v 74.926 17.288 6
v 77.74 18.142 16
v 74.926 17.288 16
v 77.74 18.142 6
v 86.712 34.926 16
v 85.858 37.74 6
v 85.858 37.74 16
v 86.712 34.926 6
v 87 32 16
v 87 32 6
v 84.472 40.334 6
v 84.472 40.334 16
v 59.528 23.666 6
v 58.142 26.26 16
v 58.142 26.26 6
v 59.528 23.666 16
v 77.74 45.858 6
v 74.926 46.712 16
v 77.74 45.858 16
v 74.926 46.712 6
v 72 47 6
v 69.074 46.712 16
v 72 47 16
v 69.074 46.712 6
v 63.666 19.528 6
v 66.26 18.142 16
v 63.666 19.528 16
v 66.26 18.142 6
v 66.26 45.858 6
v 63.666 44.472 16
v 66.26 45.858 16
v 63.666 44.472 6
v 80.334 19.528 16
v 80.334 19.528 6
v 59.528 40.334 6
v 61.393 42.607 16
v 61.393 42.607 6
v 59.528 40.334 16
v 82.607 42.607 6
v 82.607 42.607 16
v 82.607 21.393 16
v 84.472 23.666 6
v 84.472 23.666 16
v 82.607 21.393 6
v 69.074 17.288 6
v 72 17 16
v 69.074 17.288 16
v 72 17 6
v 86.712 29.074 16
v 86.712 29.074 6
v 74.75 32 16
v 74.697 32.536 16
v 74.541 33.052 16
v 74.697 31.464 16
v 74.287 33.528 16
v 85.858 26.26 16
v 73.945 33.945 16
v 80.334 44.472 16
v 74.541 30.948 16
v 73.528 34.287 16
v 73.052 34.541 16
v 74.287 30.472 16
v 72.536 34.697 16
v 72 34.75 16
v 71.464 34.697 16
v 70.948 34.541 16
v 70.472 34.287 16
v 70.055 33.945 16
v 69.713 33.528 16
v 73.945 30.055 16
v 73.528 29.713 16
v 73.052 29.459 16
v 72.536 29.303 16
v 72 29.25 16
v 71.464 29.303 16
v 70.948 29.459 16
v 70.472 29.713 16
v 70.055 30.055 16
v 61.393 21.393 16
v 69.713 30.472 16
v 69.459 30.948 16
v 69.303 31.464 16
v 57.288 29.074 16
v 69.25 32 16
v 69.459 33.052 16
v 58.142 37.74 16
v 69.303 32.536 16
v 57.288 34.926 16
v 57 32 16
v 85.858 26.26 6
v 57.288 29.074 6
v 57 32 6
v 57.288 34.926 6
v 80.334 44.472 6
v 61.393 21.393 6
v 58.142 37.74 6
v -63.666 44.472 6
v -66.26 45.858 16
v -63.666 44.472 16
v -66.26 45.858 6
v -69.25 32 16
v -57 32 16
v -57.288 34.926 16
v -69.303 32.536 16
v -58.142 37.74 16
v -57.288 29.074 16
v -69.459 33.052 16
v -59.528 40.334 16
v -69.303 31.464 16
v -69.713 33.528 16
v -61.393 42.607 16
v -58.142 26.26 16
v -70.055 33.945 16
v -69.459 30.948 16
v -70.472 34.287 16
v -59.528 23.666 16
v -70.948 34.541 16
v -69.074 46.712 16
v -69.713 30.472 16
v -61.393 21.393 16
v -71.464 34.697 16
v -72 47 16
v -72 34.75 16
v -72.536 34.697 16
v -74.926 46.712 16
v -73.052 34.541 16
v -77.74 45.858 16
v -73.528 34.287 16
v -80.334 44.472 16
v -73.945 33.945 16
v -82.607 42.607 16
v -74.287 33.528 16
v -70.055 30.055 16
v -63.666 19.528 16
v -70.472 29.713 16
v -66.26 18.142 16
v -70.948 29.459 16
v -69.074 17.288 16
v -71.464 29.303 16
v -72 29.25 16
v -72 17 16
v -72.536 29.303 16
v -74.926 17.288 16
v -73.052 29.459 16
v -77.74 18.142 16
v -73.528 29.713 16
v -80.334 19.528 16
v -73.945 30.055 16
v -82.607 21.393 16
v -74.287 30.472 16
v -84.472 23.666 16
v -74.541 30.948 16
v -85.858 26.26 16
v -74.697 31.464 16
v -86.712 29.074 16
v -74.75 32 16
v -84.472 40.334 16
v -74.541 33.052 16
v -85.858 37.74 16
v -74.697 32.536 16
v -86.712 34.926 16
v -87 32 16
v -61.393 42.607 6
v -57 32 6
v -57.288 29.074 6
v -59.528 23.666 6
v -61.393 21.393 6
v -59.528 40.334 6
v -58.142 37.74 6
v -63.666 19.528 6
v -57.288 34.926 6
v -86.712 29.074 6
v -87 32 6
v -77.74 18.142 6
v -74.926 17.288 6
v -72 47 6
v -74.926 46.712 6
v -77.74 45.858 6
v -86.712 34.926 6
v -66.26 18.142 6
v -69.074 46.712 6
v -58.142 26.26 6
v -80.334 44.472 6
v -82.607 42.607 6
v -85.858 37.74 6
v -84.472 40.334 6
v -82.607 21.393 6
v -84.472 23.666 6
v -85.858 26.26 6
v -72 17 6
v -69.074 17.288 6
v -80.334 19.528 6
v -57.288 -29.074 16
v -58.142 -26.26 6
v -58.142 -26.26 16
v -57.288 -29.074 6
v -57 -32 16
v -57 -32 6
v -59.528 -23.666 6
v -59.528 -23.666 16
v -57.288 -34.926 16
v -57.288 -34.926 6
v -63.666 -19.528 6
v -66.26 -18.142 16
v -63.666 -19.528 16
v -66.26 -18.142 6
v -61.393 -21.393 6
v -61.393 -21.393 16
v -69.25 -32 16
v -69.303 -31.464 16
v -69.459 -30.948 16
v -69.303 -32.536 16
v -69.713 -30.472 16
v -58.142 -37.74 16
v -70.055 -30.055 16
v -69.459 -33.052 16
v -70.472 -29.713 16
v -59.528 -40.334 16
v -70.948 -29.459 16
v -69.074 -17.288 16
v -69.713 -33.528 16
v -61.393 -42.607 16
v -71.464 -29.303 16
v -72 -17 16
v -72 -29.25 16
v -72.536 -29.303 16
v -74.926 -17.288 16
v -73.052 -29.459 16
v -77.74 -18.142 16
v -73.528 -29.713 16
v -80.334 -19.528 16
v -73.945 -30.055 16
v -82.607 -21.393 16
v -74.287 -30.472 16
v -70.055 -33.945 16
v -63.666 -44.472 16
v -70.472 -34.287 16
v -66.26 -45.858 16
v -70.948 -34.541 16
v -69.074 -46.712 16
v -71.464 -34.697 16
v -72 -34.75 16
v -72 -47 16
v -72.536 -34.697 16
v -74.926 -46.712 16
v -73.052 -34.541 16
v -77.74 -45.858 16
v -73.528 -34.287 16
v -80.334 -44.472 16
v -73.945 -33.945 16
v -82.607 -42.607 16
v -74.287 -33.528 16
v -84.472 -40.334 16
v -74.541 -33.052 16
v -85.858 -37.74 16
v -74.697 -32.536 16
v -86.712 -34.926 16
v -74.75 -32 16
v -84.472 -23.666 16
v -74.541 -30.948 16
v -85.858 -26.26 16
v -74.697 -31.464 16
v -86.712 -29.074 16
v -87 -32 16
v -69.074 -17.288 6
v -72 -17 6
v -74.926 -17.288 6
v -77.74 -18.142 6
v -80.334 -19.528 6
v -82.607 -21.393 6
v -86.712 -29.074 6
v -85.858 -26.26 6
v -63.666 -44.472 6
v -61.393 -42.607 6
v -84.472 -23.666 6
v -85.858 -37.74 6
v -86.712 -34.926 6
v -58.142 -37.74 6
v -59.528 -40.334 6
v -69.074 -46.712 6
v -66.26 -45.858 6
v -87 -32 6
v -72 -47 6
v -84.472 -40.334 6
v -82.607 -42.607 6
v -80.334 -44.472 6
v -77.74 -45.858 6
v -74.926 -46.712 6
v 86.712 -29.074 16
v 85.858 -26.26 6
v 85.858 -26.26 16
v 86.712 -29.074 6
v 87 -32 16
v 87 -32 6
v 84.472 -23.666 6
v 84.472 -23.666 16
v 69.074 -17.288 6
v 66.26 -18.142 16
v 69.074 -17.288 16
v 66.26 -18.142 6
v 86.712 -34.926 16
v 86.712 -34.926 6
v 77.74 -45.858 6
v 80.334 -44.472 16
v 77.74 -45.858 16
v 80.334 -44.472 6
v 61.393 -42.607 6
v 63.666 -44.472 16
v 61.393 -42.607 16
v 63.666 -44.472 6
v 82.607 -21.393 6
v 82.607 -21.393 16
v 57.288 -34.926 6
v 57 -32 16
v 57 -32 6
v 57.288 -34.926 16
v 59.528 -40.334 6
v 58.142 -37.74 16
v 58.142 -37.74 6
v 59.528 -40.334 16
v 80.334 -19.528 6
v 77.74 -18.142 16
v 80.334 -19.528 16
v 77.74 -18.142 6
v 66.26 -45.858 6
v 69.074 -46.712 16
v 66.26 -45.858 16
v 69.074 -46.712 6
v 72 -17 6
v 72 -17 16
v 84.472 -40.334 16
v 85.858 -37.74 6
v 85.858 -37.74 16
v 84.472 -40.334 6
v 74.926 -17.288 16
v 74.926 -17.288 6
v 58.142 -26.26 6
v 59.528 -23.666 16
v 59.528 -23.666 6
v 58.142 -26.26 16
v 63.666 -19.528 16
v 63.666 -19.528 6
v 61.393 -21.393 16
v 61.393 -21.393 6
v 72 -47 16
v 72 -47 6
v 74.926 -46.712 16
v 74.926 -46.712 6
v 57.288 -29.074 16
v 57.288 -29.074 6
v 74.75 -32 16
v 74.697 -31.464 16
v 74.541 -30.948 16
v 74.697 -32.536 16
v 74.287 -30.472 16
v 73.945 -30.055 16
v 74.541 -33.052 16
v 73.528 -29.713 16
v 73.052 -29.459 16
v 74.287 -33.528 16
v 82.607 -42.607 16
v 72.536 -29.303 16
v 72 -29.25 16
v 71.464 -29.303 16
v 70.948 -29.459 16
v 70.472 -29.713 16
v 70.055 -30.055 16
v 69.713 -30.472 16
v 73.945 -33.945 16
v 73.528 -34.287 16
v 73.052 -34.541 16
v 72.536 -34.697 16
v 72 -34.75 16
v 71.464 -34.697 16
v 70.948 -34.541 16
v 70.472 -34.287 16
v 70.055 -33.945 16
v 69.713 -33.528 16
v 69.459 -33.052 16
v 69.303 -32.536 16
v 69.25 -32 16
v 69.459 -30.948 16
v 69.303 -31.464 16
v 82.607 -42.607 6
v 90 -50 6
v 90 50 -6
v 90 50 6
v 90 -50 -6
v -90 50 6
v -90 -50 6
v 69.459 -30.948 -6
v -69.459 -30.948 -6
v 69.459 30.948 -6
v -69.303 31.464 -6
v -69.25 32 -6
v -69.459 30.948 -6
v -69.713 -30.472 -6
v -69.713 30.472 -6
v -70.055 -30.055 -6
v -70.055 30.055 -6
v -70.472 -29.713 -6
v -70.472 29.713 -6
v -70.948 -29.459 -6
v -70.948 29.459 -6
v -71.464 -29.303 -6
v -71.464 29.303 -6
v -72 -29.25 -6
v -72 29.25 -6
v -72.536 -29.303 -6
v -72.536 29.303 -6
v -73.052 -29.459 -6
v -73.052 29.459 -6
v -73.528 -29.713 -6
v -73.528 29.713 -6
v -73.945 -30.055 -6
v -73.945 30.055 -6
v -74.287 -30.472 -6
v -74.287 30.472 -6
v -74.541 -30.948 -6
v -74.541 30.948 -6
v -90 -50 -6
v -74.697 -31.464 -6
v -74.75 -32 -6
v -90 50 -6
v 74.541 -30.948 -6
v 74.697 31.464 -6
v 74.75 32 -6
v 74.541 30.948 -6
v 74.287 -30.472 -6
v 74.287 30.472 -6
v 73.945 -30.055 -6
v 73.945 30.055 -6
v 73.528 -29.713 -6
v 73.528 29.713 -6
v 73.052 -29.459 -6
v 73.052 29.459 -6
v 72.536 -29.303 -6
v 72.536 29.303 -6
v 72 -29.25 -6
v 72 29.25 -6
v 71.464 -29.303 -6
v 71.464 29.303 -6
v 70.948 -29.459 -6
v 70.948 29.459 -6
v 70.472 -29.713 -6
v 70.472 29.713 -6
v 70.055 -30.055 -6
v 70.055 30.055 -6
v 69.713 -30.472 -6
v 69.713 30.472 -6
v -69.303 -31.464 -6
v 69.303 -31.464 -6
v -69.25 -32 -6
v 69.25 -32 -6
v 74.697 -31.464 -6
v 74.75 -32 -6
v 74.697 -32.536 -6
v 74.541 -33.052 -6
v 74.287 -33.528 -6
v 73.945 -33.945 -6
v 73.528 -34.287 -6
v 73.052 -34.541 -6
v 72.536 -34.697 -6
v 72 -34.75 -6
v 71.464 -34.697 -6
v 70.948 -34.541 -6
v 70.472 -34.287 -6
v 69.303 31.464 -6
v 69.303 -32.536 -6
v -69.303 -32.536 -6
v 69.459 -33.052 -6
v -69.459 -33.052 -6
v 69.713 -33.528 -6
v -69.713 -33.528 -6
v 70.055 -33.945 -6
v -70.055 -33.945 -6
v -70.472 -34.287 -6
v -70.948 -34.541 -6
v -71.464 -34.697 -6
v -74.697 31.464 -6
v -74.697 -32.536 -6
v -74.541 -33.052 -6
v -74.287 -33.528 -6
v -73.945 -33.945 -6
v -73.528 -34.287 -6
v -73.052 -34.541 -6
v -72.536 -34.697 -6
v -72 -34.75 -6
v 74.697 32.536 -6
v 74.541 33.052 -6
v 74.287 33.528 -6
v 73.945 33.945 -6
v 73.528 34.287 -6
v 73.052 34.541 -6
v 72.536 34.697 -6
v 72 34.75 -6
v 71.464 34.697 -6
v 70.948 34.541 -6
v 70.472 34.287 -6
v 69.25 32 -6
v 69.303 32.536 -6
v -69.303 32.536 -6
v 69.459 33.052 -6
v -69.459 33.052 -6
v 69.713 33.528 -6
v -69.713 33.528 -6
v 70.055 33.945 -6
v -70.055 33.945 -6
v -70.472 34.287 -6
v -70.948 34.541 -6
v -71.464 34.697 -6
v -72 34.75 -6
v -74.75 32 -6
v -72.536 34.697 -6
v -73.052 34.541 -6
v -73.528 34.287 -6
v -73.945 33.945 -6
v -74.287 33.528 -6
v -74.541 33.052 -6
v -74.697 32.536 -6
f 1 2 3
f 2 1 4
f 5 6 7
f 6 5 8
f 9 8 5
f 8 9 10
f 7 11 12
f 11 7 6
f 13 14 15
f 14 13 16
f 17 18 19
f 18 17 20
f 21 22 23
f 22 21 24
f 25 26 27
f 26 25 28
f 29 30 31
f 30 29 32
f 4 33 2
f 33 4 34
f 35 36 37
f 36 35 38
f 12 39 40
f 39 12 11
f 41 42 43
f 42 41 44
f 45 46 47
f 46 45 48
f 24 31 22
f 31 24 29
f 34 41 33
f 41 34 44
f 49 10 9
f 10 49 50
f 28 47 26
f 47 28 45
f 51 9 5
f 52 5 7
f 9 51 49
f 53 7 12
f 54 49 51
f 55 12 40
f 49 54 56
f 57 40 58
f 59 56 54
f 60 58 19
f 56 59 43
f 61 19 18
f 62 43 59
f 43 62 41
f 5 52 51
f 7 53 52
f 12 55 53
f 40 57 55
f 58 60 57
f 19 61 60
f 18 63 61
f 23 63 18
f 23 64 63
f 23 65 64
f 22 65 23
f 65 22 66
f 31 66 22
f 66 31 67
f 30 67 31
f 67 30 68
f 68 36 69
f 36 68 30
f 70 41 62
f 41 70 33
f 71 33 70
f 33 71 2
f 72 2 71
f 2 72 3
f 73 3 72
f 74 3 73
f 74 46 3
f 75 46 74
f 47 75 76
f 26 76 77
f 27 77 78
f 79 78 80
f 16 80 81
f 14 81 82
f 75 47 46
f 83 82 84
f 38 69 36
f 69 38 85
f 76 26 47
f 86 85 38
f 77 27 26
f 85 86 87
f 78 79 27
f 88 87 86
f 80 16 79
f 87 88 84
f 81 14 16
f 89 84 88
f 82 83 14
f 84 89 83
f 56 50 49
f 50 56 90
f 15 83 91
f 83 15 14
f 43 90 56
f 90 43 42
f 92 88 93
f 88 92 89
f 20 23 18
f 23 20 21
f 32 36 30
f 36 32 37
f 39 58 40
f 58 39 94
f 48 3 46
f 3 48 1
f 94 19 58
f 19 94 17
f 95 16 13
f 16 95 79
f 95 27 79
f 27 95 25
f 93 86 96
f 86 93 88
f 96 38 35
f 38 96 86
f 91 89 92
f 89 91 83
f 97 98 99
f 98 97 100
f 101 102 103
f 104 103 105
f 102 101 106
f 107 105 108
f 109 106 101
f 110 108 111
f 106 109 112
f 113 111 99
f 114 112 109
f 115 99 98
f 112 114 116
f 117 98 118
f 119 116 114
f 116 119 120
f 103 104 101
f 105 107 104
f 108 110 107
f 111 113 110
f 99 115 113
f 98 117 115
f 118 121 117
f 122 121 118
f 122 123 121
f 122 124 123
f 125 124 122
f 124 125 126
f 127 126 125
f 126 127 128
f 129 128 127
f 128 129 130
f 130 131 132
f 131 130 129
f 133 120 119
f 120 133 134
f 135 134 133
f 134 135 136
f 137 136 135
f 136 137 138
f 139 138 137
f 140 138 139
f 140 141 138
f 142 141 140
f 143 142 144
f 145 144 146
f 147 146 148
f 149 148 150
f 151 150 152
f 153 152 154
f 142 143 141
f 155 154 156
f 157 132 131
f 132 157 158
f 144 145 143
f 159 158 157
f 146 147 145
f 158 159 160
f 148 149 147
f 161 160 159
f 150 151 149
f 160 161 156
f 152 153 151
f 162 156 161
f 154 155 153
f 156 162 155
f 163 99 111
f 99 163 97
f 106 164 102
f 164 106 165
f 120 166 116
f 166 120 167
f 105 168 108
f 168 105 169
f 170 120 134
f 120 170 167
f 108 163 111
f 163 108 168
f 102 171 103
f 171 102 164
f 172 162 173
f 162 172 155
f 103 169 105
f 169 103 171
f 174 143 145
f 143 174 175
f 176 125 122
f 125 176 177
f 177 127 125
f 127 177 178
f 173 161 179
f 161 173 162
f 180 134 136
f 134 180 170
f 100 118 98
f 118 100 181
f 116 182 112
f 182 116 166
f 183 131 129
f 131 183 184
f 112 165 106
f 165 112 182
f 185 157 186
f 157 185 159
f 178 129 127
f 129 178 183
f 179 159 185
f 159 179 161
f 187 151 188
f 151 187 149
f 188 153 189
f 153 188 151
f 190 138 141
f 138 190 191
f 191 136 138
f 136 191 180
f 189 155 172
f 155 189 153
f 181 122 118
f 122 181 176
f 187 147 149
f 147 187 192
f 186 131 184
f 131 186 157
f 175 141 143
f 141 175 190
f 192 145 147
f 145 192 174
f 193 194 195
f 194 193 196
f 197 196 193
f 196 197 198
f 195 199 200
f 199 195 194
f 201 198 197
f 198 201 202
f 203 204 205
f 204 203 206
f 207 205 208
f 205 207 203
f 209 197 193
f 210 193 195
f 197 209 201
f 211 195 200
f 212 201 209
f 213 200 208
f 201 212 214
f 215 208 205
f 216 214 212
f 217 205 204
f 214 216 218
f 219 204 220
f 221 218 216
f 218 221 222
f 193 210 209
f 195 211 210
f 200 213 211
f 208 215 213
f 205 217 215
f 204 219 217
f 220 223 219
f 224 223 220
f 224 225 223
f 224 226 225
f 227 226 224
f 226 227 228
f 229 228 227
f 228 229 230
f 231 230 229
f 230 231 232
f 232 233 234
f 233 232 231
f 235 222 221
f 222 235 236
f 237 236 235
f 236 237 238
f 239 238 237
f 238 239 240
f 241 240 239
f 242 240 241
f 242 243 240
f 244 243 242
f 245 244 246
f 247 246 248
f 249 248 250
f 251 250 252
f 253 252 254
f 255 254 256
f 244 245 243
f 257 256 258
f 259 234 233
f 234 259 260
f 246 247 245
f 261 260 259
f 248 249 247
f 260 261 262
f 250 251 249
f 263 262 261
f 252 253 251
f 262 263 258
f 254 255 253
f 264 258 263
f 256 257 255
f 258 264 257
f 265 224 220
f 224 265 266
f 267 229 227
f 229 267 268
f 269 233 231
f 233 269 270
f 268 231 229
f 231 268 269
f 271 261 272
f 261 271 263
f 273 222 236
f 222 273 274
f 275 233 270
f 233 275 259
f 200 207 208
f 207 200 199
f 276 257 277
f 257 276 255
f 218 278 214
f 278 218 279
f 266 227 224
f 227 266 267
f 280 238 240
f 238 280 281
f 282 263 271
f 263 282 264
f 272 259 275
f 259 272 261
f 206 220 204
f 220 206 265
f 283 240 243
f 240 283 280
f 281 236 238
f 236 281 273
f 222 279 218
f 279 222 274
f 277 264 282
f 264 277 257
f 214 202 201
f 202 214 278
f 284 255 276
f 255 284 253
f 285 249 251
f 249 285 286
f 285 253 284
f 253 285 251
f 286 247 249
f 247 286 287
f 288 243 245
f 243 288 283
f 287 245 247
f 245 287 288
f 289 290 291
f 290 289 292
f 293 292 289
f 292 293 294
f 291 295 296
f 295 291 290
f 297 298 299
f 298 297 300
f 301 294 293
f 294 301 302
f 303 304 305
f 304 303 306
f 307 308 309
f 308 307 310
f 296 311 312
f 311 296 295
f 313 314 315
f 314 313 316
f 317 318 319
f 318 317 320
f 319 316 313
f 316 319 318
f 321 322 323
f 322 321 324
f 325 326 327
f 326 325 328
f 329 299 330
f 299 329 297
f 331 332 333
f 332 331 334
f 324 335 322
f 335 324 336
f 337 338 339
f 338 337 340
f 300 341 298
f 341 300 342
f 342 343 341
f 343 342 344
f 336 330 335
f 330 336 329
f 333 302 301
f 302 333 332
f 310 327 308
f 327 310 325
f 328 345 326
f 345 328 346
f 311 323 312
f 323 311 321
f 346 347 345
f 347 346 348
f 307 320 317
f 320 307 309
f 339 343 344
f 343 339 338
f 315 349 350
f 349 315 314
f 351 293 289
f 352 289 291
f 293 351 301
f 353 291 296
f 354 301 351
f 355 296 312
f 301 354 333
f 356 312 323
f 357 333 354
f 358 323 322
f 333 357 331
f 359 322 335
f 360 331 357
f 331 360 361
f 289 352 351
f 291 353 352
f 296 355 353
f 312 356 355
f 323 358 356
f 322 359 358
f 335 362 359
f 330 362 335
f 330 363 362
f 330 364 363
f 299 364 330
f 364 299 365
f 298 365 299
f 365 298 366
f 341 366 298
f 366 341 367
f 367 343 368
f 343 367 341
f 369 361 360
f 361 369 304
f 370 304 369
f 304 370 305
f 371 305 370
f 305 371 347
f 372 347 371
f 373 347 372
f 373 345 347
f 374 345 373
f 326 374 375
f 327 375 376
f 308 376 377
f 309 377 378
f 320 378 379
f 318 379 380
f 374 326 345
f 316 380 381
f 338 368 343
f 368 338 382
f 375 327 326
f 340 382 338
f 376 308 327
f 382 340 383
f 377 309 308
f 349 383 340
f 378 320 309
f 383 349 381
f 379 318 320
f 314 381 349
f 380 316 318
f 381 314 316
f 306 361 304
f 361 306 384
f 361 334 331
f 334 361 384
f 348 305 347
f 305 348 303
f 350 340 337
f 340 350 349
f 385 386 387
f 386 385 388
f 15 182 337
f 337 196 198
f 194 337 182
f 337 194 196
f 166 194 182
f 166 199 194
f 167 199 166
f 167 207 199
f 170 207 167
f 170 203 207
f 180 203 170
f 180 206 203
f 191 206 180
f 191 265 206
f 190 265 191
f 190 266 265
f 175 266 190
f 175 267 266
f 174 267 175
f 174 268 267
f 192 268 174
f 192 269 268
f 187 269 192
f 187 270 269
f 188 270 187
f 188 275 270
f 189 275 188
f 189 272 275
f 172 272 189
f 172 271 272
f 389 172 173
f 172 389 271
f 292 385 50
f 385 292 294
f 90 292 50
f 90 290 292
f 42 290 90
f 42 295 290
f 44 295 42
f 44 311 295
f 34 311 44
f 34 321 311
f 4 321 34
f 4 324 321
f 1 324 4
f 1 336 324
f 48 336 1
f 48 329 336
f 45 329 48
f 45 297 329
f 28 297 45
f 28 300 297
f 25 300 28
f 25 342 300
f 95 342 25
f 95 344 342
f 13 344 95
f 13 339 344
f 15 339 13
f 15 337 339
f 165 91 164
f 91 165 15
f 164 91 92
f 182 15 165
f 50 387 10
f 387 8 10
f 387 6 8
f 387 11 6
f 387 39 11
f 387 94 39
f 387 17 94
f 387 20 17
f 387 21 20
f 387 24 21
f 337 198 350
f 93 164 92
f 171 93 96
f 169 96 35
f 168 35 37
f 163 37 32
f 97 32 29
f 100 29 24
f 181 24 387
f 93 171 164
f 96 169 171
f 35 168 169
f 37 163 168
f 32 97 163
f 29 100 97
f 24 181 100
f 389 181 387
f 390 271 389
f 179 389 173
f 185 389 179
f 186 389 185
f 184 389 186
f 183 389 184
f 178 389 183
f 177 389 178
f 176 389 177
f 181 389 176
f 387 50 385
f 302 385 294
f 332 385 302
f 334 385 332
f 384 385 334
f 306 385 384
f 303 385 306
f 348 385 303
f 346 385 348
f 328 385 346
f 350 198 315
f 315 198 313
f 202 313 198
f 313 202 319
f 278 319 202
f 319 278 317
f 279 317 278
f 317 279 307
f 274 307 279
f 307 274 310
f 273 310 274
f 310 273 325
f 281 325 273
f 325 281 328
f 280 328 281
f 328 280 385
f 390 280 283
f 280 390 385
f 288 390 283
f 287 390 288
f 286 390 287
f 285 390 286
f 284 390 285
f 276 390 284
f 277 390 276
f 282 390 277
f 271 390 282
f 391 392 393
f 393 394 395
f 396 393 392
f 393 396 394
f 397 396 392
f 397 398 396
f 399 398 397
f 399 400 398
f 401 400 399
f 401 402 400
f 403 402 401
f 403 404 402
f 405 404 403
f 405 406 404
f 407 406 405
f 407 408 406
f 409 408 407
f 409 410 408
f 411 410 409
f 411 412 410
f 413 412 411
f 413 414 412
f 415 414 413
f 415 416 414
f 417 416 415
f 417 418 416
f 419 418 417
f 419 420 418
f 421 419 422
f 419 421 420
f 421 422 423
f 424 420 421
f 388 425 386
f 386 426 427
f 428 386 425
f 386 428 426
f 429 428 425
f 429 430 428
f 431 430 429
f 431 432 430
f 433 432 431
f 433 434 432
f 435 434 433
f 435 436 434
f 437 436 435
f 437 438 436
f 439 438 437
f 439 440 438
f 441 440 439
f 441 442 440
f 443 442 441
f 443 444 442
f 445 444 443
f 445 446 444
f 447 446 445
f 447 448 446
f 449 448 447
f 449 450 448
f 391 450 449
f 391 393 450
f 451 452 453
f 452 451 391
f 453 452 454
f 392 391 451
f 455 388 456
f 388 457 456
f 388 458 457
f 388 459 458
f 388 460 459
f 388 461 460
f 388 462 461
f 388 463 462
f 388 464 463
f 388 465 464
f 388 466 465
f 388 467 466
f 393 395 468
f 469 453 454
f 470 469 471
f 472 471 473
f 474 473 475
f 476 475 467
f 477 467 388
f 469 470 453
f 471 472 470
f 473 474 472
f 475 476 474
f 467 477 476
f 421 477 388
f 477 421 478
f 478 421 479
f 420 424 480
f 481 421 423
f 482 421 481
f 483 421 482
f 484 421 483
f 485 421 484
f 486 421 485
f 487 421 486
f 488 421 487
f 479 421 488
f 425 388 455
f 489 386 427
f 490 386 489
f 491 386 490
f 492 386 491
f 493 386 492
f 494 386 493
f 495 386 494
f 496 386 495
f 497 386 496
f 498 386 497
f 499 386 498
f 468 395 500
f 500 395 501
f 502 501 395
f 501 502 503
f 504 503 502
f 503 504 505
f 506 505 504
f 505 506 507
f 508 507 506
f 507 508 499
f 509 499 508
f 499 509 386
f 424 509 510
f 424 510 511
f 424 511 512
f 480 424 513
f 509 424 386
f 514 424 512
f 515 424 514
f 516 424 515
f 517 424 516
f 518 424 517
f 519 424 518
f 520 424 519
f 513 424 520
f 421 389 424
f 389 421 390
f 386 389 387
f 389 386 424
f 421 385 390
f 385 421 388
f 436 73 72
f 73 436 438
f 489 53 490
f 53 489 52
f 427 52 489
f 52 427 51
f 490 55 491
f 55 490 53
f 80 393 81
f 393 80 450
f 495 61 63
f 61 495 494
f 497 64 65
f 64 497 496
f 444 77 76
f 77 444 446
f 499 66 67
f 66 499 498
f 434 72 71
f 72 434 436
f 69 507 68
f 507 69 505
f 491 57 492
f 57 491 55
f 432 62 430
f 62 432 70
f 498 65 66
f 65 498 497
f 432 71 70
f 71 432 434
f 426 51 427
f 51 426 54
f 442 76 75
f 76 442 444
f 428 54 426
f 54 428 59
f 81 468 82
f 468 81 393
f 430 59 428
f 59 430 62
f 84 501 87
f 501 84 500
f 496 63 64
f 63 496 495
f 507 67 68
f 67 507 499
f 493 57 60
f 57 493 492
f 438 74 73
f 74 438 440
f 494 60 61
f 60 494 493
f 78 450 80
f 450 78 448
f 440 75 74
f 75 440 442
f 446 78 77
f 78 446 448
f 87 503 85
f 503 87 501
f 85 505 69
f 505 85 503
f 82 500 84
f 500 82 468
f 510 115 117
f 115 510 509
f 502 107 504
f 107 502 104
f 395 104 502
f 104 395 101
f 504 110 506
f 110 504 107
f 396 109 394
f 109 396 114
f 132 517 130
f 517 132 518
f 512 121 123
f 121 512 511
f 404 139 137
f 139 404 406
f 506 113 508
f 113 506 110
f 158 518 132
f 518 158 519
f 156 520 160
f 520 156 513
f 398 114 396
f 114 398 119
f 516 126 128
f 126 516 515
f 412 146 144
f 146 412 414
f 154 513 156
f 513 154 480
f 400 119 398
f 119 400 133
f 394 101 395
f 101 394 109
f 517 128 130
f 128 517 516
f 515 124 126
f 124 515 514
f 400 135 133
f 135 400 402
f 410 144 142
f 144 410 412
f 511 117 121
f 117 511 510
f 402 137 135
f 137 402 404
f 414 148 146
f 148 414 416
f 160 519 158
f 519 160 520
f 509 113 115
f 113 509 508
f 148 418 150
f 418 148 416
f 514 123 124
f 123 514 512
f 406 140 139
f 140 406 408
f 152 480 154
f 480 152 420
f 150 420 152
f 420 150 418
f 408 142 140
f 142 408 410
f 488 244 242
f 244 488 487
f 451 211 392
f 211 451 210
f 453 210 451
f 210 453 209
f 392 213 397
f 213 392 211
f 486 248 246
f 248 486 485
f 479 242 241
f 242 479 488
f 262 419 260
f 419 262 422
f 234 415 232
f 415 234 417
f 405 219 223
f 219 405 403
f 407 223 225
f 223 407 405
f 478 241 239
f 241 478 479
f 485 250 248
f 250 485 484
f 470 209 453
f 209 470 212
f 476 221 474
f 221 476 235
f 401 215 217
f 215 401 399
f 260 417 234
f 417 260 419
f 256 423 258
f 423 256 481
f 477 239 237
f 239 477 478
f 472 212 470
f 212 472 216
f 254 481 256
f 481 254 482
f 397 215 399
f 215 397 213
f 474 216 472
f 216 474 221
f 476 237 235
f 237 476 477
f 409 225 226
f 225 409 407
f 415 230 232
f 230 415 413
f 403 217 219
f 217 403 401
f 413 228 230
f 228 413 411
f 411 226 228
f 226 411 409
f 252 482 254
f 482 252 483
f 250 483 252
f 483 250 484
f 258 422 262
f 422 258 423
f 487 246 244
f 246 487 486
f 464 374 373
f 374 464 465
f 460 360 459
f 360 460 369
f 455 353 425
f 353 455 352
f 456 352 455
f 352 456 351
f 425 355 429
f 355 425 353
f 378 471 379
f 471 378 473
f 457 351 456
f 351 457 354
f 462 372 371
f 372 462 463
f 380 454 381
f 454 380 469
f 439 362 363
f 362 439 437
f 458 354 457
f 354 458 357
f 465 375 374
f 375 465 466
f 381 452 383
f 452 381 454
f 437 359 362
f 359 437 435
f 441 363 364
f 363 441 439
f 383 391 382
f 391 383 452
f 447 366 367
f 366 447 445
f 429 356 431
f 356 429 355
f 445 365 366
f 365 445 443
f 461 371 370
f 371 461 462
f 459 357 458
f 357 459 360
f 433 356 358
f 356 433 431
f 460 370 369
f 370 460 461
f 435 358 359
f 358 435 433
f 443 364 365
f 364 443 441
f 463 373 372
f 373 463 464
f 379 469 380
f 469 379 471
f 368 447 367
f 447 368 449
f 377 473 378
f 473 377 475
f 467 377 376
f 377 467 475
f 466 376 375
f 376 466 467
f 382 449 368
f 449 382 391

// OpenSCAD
$fn = 32;

// ----------------------------------------------------------------------
// Anchor pads 180 x 100 x 22
// four corner bosses with anchor holes
// ----------------------------------------------------------------------

// --- parameters (mm) ---
plate = [180, 100, 12];  // base plate size (x, y, z)
pads = 4;                // boss count, one per corner
edge = 18;               // boss centre offset from the plate edge
boss_d = 30;             // boss diameter
boss_h = 10;             // boss height above the base plate
hole_d = 5.5;            // hole diameter

// --- derived feature positions (mm) ---
height = plate[2] + boss_h;      // = 22   overall height of the part
corner_x = plate[0] / 2 - edge;  // = 72   boss centre X
corner_y = plate[1] / 2 - edge;  // = 32   boss centre Y
feature_centers = [
  [corner_x, corner_y],
  [-corner_x, corner_y],
  [-corner_x, -corner_y],
  [corner_x, -corner_y]
];   // boss centres, anchor holes are drilled there

// base plate, four bosses standing on it, anchor holes all the way through
difference() {
  union() {
    cube(plate, center = true);
    for (centre = feature_centers)
      translate([centre[0], centre[1], plate[2] / 2 - 1])
        cylinder(d = boss_d, h = boss_h + 1);
  }
  for (centre = feature_centers)
    translate([centre[0], centre[1], -height])
      cylinder(d = hole_d, h = 2 * height + 2);  // through boss and plate
}
